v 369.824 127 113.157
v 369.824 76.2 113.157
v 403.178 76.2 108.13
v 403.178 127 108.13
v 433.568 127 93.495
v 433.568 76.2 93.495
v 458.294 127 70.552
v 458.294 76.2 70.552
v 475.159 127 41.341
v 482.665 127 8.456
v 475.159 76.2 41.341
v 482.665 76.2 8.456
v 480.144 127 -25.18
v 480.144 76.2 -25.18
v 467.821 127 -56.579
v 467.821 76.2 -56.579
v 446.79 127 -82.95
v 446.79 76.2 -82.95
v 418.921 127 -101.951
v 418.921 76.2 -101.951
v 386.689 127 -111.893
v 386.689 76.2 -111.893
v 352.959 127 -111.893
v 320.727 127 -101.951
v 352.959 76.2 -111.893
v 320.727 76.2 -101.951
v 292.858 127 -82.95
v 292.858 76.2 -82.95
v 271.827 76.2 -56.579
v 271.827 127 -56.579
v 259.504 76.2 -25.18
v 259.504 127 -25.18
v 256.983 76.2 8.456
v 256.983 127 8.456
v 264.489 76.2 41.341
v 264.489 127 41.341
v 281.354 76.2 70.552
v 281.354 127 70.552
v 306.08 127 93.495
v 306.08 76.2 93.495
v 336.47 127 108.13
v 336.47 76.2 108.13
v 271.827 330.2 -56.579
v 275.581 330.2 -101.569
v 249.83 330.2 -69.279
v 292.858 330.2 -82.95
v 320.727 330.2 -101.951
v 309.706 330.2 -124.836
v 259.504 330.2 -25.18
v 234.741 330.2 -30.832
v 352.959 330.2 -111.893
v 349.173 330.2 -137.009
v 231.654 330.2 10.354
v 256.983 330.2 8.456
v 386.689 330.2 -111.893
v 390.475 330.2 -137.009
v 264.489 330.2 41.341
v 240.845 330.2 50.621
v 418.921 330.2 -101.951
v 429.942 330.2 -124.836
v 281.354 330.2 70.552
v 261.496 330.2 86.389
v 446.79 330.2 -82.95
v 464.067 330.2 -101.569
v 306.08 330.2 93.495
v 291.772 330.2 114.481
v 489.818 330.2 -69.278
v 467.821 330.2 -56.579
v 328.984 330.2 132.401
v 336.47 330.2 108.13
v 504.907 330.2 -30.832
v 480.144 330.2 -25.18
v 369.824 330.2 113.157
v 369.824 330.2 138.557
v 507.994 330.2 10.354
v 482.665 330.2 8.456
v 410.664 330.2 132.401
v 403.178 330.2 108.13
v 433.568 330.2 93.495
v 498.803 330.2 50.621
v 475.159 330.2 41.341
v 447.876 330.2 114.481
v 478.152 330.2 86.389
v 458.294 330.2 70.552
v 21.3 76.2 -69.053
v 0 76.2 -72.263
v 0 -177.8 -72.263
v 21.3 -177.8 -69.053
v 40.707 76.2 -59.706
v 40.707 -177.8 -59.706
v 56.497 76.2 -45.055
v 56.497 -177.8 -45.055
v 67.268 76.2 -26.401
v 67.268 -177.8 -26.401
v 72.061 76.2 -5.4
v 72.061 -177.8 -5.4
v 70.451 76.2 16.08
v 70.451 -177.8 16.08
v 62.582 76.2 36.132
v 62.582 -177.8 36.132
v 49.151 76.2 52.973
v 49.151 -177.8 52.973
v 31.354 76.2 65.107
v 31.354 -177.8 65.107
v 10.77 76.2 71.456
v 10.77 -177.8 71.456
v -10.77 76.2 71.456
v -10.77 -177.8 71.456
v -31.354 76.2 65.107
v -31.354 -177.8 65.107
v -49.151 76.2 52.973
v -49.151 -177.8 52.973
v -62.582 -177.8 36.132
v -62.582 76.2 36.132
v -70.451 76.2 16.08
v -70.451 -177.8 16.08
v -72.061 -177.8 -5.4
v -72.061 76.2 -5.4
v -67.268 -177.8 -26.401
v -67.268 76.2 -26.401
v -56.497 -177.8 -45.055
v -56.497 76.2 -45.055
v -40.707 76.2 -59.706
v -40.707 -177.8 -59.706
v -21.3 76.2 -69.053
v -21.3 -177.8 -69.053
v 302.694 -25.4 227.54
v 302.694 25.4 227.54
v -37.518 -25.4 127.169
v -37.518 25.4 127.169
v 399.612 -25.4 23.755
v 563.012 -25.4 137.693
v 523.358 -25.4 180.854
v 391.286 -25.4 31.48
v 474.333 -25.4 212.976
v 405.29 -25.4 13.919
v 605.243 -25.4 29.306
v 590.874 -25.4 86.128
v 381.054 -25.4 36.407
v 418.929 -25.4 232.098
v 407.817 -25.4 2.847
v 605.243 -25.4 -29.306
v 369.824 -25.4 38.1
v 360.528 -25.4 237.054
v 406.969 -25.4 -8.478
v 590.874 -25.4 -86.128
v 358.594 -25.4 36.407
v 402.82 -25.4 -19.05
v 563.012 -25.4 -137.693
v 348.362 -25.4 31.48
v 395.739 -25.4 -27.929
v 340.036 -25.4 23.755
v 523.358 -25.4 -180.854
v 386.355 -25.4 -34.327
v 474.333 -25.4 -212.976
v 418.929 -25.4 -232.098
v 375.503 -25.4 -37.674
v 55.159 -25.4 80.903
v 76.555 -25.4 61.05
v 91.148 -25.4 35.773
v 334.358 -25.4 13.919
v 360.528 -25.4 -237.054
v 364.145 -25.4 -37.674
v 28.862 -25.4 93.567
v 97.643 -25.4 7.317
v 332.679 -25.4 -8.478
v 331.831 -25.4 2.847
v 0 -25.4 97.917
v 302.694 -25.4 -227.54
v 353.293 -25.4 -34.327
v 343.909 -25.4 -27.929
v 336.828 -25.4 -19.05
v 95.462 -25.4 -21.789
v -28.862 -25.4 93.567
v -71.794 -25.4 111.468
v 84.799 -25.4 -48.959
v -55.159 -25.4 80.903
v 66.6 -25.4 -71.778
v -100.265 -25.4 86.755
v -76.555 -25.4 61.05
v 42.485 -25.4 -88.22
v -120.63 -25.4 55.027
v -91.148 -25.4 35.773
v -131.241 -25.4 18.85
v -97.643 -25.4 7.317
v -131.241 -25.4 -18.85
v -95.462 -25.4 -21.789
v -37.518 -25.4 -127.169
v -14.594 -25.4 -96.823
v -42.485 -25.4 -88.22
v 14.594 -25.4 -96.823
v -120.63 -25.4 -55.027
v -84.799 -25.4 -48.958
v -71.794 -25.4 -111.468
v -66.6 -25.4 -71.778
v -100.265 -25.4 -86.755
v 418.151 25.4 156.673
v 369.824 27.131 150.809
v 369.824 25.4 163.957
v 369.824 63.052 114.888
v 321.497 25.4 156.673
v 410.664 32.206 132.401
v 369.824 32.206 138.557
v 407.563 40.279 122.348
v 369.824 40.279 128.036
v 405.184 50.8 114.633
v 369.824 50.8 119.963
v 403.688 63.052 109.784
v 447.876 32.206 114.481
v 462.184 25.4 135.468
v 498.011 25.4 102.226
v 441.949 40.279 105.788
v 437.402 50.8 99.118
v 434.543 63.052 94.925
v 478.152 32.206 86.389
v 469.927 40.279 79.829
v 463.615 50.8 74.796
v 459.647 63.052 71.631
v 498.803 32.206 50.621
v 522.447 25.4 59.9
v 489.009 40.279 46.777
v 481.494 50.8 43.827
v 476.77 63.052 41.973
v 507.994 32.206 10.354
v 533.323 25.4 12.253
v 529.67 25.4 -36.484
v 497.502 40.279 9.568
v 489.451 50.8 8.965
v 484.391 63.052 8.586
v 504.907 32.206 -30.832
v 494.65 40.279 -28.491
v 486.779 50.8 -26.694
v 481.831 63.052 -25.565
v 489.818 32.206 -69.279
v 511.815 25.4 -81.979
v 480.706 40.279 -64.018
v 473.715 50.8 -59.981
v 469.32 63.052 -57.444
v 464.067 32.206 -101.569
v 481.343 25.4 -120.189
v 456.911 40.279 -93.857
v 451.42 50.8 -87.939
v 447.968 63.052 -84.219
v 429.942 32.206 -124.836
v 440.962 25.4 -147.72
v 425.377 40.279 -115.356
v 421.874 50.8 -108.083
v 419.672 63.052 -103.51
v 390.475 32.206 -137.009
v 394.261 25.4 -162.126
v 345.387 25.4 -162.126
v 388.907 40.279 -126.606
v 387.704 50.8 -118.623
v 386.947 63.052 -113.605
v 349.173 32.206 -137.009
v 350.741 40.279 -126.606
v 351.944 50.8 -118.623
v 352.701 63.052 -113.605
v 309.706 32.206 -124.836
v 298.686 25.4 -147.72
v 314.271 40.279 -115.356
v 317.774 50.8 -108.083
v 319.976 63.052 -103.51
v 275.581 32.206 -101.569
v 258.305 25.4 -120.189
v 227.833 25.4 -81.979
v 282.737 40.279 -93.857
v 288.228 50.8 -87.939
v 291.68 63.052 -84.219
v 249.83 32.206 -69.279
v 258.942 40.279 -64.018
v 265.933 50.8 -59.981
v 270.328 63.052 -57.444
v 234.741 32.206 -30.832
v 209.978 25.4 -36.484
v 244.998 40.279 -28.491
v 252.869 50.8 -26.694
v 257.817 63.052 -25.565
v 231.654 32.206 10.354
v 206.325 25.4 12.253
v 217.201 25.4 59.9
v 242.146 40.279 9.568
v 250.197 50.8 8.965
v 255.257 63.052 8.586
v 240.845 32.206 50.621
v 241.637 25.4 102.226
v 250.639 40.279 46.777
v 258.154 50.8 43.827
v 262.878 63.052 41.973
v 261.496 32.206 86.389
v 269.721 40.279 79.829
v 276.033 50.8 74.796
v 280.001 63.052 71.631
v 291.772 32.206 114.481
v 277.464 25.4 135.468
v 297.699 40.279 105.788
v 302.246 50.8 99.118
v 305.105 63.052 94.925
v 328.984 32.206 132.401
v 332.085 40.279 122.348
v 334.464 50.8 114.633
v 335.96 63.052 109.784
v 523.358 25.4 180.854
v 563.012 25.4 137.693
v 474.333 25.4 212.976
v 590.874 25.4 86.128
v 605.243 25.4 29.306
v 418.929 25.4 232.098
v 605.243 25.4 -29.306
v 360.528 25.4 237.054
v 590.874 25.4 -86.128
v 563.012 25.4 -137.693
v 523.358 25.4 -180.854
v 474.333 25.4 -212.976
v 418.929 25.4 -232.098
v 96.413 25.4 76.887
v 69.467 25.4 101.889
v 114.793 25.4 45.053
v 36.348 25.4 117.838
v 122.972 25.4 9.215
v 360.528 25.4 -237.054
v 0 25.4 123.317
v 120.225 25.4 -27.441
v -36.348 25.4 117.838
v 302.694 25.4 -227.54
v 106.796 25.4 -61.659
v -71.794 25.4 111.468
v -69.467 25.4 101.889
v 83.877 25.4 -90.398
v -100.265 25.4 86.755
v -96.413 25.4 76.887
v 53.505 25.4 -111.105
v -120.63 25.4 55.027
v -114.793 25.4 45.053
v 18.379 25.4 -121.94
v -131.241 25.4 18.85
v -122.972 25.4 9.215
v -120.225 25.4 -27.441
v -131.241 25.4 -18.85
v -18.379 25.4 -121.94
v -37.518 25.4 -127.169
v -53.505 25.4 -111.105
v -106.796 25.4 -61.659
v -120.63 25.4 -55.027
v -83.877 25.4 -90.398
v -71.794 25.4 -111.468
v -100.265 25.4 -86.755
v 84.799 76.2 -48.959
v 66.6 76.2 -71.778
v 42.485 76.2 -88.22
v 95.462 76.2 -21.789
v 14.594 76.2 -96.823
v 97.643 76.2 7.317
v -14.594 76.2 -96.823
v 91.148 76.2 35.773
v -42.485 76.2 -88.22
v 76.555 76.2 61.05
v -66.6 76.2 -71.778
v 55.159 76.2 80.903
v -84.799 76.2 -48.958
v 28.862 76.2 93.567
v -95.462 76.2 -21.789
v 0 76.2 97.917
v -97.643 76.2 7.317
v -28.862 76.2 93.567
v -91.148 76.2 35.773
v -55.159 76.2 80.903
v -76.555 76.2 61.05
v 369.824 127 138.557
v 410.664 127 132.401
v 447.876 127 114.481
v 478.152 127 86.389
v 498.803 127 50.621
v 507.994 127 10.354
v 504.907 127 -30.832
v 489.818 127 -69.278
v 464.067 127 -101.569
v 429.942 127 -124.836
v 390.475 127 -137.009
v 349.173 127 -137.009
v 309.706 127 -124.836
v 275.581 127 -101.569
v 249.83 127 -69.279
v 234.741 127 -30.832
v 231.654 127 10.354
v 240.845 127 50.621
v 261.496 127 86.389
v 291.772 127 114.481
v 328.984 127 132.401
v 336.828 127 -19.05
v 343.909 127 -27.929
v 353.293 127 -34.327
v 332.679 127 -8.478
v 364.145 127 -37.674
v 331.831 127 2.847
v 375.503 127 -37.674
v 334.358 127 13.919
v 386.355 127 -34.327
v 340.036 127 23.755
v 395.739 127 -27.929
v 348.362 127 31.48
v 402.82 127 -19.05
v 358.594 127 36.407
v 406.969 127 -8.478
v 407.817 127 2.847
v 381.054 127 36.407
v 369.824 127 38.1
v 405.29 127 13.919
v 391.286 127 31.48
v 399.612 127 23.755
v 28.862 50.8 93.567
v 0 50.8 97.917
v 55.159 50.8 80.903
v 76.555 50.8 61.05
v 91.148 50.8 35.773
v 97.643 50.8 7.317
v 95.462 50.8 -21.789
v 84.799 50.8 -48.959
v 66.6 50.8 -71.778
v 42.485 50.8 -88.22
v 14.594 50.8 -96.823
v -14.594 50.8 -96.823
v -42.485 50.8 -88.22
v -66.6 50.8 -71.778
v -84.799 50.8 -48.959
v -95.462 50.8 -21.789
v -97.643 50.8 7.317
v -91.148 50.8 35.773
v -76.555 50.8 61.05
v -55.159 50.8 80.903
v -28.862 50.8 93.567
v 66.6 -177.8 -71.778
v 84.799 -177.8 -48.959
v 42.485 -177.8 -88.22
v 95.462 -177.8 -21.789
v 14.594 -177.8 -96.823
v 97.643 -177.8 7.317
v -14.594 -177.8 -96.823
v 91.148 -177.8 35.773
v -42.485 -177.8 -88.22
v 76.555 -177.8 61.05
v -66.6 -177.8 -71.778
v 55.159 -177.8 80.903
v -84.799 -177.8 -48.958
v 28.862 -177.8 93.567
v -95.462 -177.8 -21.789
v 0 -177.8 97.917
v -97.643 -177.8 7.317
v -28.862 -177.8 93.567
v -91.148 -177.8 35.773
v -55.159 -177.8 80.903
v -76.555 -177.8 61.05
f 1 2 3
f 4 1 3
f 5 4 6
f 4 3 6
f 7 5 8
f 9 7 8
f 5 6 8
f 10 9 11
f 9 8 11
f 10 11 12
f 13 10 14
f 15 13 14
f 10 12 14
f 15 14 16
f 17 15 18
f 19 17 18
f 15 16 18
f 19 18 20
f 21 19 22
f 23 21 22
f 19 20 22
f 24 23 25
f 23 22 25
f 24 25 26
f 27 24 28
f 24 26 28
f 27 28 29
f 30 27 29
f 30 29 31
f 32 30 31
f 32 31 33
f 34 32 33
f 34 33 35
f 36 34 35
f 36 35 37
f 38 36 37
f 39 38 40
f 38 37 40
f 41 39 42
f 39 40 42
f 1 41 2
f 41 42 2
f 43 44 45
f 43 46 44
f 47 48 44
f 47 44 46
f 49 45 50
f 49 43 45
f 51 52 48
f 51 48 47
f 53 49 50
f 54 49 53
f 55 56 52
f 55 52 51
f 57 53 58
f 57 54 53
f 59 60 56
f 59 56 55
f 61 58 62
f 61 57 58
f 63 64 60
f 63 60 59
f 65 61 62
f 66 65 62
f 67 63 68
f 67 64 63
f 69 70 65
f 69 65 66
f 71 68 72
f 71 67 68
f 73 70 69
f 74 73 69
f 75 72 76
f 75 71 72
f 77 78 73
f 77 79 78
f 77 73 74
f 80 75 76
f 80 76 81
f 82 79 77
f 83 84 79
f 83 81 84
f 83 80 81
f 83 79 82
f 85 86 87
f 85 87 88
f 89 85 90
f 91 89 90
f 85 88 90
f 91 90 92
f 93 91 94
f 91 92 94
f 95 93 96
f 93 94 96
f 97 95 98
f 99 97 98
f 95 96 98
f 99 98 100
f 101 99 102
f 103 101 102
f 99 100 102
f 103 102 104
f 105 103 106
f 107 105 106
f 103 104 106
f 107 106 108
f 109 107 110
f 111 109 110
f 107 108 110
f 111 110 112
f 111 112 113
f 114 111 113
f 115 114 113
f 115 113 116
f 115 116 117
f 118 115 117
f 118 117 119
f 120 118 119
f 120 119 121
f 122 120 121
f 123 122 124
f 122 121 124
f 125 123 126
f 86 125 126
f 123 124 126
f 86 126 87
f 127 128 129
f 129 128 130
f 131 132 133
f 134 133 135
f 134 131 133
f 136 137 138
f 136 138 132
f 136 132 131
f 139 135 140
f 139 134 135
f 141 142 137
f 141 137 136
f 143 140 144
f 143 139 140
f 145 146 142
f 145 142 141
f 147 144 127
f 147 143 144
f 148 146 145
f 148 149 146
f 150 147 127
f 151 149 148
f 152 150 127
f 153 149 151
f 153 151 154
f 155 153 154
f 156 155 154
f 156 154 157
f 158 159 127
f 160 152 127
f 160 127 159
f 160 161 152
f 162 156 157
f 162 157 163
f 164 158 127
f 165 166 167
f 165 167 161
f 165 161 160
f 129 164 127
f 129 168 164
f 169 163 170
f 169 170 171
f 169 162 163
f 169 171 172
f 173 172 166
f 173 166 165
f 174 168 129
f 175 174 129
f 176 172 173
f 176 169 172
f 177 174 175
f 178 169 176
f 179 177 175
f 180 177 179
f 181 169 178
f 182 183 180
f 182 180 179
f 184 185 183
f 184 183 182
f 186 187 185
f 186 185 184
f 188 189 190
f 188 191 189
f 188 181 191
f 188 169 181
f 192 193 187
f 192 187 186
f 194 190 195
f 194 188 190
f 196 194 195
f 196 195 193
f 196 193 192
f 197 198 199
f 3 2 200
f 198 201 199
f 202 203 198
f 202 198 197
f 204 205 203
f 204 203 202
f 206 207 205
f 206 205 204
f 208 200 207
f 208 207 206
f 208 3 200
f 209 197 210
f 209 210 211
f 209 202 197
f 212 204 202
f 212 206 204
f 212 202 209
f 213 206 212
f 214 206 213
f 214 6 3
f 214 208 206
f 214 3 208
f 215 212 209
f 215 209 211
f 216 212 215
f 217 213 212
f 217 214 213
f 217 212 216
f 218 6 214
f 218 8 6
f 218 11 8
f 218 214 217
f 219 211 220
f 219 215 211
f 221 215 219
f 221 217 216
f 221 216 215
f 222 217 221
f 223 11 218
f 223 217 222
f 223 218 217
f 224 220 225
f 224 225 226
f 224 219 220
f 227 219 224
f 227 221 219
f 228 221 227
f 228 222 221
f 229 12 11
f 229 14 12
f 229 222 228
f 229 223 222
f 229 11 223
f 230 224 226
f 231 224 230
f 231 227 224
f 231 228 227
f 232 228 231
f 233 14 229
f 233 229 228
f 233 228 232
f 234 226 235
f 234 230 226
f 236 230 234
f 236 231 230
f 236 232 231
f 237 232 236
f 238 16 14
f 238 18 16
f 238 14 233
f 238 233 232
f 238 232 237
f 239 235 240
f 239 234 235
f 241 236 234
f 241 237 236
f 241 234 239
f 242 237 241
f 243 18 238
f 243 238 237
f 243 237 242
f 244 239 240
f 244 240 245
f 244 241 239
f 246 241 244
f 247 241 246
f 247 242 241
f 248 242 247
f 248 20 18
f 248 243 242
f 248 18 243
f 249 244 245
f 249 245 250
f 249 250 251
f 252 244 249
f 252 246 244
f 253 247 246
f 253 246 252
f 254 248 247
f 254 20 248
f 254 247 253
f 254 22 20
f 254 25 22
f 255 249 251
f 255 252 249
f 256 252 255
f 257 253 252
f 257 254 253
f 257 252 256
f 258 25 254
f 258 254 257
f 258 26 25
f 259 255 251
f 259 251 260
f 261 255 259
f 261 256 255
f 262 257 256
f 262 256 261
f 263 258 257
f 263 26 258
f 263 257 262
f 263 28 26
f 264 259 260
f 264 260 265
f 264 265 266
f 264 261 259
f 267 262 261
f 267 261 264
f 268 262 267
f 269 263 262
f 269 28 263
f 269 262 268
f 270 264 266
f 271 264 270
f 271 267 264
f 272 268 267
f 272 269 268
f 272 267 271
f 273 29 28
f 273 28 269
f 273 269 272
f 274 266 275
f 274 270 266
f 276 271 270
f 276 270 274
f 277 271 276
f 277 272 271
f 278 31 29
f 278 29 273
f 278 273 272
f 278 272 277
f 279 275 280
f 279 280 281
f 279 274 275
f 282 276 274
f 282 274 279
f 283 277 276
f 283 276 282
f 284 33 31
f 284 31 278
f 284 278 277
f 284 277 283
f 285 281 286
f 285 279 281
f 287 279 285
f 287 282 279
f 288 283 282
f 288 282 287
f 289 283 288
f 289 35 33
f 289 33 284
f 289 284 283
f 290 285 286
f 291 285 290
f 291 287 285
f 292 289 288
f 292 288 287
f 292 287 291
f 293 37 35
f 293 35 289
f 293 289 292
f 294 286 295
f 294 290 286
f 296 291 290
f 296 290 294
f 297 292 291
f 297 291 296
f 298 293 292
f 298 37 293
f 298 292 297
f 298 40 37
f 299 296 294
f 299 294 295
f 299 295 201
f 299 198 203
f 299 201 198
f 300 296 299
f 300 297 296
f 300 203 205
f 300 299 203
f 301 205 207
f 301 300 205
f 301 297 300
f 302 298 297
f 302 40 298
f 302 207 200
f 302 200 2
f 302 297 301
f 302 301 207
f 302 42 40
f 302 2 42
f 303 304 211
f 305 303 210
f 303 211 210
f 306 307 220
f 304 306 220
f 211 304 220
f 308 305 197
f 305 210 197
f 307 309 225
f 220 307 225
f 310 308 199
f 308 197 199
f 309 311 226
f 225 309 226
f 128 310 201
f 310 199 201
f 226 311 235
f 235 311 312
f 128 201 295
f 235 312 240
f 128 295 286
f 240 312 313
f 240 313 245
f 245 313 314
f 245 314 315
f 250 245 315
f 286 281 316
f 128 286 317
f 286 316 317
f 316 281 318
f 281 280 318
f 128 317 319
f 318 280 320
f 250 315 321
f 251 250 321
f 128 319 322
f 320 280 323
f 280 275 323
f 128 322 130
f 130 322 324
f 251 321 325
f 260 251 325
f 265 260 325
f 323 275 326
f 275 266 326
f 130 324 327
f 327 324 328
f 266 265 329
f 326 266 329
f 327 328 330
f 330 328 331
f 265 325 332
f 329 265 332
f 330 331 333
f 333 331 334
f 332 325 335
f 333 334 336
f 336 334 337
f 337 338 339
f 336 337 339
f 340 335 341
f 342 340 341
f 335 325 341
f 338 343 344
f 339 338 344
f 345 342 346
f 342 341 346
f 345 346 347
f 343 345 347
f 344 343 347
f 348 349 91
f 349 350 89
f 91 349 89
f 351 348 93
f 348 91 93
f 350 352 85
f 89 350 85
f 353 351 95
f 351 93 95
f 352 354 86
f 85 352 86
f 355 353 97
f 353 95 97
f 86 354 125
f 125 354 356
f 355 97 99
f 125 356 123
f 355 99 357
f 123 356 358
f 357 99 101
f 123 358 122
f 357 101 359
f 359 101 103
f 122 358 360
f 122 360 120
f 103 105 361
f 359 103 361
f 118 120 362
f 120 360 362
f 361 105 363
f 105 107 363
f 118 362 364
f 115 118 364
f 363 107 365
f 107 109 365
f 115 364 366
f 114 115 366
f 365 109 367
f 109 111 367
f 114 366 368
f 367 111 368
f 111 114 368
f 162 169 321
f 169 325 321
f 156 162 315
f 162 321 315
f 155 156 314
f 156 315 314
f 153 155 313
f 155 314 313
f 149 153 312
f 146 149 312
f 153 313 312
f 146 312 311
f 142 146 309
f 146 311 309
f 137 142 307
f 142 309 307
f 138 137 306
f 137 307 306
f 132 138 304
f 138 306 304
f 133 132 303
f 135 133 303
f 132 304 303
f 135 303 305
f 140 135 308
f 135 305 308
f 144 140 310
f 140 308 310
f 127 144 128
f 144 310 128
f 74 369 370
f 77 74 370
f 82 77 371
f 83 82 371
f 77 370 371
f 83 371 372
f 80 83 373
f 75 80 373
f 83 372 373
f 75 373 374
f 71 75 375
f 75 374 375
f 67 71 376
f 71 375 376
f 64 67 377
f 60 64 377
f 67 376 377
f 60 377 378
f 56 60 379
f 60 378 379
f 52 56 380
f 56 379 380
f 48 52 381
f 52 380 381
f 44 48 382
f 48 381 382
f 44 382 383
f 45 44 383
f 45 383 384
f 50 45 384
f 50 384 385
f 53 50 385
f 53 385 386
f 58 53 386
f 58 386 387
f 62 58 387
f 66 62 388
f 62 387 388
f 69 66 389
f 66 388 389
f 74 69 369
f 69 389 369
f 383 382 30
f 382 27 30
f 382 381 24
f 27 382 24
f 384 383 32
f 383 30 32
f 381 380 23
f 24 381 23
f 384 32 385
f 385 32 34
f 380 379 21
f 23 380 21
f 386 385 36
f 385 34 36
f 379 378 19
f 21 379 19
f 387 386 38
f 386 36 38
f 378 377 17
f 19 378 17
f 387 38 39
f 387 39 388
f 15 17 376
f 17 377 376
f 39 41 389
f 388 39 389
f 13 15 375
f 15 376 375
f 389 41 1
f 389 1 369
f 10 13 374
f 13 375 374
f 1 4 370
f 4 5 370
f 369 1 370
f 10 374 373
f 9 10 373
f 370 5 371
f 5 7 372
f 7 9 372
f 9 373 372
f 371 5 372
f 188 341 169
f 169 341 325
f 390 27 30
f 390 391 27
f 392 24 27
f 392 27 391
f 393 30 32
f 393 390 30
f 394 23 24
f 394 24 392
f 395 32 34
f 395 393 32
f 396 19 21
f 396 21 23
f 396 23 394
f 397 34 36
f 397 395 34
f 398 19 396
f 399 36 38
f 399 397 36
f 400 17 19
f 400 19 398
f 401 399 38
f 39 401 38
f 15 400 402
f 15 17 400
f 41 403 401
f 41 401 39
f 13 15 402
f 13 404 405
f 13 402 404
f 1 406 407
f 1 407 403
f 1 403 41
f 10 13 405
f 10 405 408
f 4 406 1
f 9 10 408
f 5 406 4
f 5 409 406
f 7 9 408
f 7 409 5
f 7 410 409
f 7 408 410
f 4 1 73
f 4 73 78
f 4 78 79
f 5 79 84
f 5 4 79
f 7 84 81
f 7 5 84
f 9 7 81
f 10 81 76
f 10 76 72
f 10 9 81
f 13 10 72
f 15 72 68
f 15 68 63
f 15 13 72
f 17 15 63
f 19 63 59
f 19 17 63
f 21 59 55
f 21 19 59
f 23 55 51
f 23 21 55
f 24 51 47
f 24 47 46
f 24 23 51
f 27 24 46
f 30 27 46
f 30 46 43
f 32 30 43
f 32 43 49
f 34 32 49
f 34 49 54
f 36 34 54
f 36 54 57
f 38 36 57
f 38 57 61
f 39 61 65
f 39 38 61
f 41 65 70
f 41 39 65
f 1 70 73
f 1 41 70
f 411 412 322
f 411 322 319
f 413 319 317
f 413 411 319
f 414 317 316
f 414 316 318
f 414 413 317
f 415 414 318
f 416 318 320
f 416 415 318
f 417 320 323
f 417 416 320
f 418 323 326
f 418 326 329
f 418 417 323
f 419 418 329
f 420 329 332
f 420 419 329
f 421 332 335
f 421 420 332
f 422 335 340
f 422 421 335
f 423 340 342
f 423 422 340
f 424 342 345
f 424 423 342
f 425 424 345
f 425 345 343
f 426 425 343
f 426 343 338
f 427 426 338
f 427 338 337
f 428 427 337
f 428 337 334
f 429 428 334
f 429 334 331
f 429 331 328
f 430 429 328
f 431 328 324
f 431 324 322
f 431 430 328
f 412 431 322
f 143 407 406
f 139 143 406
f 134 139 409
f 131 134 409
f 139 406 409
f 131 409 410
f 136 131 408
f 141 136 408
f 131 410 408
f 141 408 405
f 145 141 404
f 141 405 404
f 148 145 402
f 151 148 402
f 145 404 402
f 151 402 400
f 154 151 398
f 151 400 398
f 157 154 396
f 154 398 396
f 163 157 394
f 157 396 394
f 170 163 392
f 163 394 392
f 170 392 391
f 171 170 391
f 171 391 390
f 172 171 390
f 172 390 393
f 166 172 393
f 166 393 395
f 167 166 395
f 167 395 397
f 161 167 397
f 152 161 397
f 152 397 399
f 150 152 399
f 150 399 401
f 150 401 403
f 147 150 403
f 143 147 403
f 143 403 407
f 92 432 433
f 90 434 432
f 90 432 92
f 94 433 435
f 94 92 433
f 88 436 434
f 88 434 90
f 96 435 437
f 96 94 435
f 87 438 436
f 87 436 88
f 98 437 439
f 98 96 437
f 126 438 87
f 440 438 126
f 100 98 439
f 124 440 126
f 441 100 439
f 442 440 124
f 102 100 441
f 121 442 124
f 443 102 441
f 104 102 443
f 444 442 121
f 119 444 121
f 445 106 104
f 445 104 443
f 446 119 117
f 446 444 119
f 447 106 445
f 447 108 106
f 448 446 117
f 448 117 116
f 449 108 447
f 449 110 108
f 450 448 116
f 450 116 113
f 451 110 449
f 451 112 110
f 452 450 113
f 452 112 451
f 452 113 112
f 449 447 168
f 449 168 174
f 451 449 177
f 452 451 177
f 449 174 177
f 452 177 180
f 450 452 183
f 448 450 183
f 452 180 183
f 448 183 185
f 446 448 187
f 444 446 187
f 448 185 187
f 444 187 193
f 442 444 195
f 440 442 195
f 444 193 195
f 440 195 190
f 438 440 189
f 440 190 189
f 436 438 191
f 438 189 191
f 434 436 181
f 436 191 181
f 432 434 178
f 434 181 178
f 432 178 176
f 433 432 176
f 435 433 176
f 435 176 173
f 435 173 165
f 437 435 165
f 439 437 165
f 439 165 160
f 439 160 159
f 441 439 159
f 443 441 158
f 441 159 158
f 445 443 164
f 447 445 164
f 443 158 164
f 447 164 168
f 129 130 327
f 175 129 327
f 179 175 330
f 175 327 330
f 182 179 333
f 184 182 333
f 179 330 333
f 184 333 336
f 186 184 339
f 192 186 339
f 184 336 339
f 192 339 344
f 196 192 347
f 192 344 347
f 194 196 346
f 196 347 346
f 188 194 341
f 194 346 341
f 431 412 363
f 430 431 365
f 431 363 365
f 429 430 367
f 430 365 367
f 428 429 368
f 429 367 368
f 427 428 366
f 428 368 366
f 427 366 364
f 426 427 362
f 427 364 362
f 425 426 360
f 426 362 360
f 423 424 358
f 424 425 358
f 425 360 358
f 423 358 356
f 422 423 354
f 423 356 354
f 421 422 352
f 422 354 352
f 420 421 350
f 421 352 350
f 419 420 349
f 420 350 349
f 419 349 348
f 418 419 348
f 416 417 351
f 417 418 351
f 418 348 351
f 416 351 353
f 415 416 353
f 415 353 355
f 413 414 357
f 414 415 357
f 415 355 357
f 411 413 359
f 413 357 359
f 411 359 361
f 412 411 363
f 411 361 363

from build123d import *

# Parameters (mm, degrees)
BOSS_EXTRUDE1_DEPTH = 25.4
SKETCH2_R           = 97.917
BOSS_EXTRUDE2_DEPTH = 152.4
SKETCH3_R           = 72.263
CUT_EXTRUDE2_DEPTH  = 683.710043354
BOSS_EXTRUDE3_START = -254
SKETCH4_R           = 97.917
BOSS_EXTRUDE3_DEPTH = 254
SKETCH3_3_R         = 72.263
CUT_EXTRUDE3_DEPTH  = 254
SKETCH5_R           = 113.157
BOSS_EXTRUDE5_DEPTH = 101.6
SKETCH8_R           = 138.557
SKETCH8_R_2         = 113.157
BOSS_EXTRUDE6_DEPTH = 203.2
SKETCH9_R           = 38.1
CUT_EXTRUDE6_DEPTH  = 720.517757457
FILLET1_R           = 50.8
CHAMFER1_SIZE       = 25.4


with BuildPart() as part:
    # Sketch1 → Boss-Extrude1 (new, symmetric)
    with BuildSketch(Plane(origin=(0, 0, 0), x_dir=(1, 0, 0), z_dir=(0, 1, 0))):
        with BuildLine():
            Line((-37.518032967, 127.16908015), (302.694032967, 227.540078277))
            ThreePointArc((302.694032967, 227.540078277), (607.06, 0), (302.694032967, -227.540078277))
            Line((302.694032967, -227.540078277), (-37.518032967, -127.16908015))
            ThreePointArc((-37.518032967, -127.16908015), (-132.588, 0), (-37.518032967, 127.16908015))
        make_face()
    extrude(amount=BOSS_EXTRUDE1_DEPTH, both=True)

    # Sketch2 → Boss-Extrude2 (add)
    with BuildSketch(Plane.XZ.offset(25.4)):
        Circle(SKETCH2_R)
    extrude(amount=BOSS_EXTRUDE2_DEPTH)

    # Sketch3 → Cut-Extrude2 (cut, through all)
    with BuildSketch(Plane.XZ.offset(177.8)):
        Circle(SKETCH3_R)
    extrude(amount=-CUT_EXTRUDE2_DEPTH, mode=Mode.SUBTRACT)

    # Sketch4 → Boss-Extrude3 (add)
    with BuildSketch(Plane.XZ.offset(177.8).offset(BOSS_EXTRUDE3_START)):
        Circle(SKETCH4_R)
    extrude(amount=BOSS_EXTRUDE3_DEPTH)

    # Sketch3<3> → Cut-Extrude3 (cut)
    with BuildSketch(Plane.XZ.offset(177.8)):
        Circle(SKETCH3_3_R)
    extrude(amount=-CUT_EXTRUDE3_DEPTH, mode=Mode.SUBTRACT)

    # Sketch5 → Boss-Extrude5 (add)
    with BuildSketch(Plane(origin=(0, 25.4, 0), x_dir=(1, 0, 0), z_dir=(0, 1, 0))):
        with Locations((369.824, 0)):
            Circle(SKETCH5_R)
    extrude(amount=BOSS_EXTRUDE5_DEPTH)

    # Sketch9 → Cut-Extrude6 (cut, through all)
    with BuildSketch(Plane(origin=(0, 127, 0), x_dir=(1, 0, 0), z_dir=(0, 1, 0))):
        with Locations((369.824, 0)):
            Circle(SKETCH9_R)
    extrude(amount=-CUT_EXTRUDE6_DEPTH, mode=Mode.SUBTRACT)

    # Fillet1
    fillet1_edges = [part.edges().sort_by_distance(p)[0] for p in [
        (256.667, 25.4, 0),
    ]]
    fillet(fillet1_edges, radius=FILLET1_R)

    # Chamfer1
    chamfer1_edges = [part.edges().sort_by_distance(p)[0] for p in [
        (-97.917, 25.4, 0),
    ]]
    chamfer(chamfer1_edges, length=CHAMFER1_SIZE)


with BuildPart() as body_2:
    # Sketch8 → Boss-Extrude6 (new body)
    with BuildSketch(Plane(origin=(0, 127, 0), x_dir=(1, 0, 0), z_dir=(0, 1, 0))):
        with Locations((369.824, 0)):
            Circle(SKETCH8_R)
        with Locations((369.824, 0)):
            Circle(SKETCH8_R_2, mode=Mode.SUBTRACT)
    extrude(amount=BOSS_EXTRUDE6_DEPTH)


solid = Compound([part.part, body_2.part])
